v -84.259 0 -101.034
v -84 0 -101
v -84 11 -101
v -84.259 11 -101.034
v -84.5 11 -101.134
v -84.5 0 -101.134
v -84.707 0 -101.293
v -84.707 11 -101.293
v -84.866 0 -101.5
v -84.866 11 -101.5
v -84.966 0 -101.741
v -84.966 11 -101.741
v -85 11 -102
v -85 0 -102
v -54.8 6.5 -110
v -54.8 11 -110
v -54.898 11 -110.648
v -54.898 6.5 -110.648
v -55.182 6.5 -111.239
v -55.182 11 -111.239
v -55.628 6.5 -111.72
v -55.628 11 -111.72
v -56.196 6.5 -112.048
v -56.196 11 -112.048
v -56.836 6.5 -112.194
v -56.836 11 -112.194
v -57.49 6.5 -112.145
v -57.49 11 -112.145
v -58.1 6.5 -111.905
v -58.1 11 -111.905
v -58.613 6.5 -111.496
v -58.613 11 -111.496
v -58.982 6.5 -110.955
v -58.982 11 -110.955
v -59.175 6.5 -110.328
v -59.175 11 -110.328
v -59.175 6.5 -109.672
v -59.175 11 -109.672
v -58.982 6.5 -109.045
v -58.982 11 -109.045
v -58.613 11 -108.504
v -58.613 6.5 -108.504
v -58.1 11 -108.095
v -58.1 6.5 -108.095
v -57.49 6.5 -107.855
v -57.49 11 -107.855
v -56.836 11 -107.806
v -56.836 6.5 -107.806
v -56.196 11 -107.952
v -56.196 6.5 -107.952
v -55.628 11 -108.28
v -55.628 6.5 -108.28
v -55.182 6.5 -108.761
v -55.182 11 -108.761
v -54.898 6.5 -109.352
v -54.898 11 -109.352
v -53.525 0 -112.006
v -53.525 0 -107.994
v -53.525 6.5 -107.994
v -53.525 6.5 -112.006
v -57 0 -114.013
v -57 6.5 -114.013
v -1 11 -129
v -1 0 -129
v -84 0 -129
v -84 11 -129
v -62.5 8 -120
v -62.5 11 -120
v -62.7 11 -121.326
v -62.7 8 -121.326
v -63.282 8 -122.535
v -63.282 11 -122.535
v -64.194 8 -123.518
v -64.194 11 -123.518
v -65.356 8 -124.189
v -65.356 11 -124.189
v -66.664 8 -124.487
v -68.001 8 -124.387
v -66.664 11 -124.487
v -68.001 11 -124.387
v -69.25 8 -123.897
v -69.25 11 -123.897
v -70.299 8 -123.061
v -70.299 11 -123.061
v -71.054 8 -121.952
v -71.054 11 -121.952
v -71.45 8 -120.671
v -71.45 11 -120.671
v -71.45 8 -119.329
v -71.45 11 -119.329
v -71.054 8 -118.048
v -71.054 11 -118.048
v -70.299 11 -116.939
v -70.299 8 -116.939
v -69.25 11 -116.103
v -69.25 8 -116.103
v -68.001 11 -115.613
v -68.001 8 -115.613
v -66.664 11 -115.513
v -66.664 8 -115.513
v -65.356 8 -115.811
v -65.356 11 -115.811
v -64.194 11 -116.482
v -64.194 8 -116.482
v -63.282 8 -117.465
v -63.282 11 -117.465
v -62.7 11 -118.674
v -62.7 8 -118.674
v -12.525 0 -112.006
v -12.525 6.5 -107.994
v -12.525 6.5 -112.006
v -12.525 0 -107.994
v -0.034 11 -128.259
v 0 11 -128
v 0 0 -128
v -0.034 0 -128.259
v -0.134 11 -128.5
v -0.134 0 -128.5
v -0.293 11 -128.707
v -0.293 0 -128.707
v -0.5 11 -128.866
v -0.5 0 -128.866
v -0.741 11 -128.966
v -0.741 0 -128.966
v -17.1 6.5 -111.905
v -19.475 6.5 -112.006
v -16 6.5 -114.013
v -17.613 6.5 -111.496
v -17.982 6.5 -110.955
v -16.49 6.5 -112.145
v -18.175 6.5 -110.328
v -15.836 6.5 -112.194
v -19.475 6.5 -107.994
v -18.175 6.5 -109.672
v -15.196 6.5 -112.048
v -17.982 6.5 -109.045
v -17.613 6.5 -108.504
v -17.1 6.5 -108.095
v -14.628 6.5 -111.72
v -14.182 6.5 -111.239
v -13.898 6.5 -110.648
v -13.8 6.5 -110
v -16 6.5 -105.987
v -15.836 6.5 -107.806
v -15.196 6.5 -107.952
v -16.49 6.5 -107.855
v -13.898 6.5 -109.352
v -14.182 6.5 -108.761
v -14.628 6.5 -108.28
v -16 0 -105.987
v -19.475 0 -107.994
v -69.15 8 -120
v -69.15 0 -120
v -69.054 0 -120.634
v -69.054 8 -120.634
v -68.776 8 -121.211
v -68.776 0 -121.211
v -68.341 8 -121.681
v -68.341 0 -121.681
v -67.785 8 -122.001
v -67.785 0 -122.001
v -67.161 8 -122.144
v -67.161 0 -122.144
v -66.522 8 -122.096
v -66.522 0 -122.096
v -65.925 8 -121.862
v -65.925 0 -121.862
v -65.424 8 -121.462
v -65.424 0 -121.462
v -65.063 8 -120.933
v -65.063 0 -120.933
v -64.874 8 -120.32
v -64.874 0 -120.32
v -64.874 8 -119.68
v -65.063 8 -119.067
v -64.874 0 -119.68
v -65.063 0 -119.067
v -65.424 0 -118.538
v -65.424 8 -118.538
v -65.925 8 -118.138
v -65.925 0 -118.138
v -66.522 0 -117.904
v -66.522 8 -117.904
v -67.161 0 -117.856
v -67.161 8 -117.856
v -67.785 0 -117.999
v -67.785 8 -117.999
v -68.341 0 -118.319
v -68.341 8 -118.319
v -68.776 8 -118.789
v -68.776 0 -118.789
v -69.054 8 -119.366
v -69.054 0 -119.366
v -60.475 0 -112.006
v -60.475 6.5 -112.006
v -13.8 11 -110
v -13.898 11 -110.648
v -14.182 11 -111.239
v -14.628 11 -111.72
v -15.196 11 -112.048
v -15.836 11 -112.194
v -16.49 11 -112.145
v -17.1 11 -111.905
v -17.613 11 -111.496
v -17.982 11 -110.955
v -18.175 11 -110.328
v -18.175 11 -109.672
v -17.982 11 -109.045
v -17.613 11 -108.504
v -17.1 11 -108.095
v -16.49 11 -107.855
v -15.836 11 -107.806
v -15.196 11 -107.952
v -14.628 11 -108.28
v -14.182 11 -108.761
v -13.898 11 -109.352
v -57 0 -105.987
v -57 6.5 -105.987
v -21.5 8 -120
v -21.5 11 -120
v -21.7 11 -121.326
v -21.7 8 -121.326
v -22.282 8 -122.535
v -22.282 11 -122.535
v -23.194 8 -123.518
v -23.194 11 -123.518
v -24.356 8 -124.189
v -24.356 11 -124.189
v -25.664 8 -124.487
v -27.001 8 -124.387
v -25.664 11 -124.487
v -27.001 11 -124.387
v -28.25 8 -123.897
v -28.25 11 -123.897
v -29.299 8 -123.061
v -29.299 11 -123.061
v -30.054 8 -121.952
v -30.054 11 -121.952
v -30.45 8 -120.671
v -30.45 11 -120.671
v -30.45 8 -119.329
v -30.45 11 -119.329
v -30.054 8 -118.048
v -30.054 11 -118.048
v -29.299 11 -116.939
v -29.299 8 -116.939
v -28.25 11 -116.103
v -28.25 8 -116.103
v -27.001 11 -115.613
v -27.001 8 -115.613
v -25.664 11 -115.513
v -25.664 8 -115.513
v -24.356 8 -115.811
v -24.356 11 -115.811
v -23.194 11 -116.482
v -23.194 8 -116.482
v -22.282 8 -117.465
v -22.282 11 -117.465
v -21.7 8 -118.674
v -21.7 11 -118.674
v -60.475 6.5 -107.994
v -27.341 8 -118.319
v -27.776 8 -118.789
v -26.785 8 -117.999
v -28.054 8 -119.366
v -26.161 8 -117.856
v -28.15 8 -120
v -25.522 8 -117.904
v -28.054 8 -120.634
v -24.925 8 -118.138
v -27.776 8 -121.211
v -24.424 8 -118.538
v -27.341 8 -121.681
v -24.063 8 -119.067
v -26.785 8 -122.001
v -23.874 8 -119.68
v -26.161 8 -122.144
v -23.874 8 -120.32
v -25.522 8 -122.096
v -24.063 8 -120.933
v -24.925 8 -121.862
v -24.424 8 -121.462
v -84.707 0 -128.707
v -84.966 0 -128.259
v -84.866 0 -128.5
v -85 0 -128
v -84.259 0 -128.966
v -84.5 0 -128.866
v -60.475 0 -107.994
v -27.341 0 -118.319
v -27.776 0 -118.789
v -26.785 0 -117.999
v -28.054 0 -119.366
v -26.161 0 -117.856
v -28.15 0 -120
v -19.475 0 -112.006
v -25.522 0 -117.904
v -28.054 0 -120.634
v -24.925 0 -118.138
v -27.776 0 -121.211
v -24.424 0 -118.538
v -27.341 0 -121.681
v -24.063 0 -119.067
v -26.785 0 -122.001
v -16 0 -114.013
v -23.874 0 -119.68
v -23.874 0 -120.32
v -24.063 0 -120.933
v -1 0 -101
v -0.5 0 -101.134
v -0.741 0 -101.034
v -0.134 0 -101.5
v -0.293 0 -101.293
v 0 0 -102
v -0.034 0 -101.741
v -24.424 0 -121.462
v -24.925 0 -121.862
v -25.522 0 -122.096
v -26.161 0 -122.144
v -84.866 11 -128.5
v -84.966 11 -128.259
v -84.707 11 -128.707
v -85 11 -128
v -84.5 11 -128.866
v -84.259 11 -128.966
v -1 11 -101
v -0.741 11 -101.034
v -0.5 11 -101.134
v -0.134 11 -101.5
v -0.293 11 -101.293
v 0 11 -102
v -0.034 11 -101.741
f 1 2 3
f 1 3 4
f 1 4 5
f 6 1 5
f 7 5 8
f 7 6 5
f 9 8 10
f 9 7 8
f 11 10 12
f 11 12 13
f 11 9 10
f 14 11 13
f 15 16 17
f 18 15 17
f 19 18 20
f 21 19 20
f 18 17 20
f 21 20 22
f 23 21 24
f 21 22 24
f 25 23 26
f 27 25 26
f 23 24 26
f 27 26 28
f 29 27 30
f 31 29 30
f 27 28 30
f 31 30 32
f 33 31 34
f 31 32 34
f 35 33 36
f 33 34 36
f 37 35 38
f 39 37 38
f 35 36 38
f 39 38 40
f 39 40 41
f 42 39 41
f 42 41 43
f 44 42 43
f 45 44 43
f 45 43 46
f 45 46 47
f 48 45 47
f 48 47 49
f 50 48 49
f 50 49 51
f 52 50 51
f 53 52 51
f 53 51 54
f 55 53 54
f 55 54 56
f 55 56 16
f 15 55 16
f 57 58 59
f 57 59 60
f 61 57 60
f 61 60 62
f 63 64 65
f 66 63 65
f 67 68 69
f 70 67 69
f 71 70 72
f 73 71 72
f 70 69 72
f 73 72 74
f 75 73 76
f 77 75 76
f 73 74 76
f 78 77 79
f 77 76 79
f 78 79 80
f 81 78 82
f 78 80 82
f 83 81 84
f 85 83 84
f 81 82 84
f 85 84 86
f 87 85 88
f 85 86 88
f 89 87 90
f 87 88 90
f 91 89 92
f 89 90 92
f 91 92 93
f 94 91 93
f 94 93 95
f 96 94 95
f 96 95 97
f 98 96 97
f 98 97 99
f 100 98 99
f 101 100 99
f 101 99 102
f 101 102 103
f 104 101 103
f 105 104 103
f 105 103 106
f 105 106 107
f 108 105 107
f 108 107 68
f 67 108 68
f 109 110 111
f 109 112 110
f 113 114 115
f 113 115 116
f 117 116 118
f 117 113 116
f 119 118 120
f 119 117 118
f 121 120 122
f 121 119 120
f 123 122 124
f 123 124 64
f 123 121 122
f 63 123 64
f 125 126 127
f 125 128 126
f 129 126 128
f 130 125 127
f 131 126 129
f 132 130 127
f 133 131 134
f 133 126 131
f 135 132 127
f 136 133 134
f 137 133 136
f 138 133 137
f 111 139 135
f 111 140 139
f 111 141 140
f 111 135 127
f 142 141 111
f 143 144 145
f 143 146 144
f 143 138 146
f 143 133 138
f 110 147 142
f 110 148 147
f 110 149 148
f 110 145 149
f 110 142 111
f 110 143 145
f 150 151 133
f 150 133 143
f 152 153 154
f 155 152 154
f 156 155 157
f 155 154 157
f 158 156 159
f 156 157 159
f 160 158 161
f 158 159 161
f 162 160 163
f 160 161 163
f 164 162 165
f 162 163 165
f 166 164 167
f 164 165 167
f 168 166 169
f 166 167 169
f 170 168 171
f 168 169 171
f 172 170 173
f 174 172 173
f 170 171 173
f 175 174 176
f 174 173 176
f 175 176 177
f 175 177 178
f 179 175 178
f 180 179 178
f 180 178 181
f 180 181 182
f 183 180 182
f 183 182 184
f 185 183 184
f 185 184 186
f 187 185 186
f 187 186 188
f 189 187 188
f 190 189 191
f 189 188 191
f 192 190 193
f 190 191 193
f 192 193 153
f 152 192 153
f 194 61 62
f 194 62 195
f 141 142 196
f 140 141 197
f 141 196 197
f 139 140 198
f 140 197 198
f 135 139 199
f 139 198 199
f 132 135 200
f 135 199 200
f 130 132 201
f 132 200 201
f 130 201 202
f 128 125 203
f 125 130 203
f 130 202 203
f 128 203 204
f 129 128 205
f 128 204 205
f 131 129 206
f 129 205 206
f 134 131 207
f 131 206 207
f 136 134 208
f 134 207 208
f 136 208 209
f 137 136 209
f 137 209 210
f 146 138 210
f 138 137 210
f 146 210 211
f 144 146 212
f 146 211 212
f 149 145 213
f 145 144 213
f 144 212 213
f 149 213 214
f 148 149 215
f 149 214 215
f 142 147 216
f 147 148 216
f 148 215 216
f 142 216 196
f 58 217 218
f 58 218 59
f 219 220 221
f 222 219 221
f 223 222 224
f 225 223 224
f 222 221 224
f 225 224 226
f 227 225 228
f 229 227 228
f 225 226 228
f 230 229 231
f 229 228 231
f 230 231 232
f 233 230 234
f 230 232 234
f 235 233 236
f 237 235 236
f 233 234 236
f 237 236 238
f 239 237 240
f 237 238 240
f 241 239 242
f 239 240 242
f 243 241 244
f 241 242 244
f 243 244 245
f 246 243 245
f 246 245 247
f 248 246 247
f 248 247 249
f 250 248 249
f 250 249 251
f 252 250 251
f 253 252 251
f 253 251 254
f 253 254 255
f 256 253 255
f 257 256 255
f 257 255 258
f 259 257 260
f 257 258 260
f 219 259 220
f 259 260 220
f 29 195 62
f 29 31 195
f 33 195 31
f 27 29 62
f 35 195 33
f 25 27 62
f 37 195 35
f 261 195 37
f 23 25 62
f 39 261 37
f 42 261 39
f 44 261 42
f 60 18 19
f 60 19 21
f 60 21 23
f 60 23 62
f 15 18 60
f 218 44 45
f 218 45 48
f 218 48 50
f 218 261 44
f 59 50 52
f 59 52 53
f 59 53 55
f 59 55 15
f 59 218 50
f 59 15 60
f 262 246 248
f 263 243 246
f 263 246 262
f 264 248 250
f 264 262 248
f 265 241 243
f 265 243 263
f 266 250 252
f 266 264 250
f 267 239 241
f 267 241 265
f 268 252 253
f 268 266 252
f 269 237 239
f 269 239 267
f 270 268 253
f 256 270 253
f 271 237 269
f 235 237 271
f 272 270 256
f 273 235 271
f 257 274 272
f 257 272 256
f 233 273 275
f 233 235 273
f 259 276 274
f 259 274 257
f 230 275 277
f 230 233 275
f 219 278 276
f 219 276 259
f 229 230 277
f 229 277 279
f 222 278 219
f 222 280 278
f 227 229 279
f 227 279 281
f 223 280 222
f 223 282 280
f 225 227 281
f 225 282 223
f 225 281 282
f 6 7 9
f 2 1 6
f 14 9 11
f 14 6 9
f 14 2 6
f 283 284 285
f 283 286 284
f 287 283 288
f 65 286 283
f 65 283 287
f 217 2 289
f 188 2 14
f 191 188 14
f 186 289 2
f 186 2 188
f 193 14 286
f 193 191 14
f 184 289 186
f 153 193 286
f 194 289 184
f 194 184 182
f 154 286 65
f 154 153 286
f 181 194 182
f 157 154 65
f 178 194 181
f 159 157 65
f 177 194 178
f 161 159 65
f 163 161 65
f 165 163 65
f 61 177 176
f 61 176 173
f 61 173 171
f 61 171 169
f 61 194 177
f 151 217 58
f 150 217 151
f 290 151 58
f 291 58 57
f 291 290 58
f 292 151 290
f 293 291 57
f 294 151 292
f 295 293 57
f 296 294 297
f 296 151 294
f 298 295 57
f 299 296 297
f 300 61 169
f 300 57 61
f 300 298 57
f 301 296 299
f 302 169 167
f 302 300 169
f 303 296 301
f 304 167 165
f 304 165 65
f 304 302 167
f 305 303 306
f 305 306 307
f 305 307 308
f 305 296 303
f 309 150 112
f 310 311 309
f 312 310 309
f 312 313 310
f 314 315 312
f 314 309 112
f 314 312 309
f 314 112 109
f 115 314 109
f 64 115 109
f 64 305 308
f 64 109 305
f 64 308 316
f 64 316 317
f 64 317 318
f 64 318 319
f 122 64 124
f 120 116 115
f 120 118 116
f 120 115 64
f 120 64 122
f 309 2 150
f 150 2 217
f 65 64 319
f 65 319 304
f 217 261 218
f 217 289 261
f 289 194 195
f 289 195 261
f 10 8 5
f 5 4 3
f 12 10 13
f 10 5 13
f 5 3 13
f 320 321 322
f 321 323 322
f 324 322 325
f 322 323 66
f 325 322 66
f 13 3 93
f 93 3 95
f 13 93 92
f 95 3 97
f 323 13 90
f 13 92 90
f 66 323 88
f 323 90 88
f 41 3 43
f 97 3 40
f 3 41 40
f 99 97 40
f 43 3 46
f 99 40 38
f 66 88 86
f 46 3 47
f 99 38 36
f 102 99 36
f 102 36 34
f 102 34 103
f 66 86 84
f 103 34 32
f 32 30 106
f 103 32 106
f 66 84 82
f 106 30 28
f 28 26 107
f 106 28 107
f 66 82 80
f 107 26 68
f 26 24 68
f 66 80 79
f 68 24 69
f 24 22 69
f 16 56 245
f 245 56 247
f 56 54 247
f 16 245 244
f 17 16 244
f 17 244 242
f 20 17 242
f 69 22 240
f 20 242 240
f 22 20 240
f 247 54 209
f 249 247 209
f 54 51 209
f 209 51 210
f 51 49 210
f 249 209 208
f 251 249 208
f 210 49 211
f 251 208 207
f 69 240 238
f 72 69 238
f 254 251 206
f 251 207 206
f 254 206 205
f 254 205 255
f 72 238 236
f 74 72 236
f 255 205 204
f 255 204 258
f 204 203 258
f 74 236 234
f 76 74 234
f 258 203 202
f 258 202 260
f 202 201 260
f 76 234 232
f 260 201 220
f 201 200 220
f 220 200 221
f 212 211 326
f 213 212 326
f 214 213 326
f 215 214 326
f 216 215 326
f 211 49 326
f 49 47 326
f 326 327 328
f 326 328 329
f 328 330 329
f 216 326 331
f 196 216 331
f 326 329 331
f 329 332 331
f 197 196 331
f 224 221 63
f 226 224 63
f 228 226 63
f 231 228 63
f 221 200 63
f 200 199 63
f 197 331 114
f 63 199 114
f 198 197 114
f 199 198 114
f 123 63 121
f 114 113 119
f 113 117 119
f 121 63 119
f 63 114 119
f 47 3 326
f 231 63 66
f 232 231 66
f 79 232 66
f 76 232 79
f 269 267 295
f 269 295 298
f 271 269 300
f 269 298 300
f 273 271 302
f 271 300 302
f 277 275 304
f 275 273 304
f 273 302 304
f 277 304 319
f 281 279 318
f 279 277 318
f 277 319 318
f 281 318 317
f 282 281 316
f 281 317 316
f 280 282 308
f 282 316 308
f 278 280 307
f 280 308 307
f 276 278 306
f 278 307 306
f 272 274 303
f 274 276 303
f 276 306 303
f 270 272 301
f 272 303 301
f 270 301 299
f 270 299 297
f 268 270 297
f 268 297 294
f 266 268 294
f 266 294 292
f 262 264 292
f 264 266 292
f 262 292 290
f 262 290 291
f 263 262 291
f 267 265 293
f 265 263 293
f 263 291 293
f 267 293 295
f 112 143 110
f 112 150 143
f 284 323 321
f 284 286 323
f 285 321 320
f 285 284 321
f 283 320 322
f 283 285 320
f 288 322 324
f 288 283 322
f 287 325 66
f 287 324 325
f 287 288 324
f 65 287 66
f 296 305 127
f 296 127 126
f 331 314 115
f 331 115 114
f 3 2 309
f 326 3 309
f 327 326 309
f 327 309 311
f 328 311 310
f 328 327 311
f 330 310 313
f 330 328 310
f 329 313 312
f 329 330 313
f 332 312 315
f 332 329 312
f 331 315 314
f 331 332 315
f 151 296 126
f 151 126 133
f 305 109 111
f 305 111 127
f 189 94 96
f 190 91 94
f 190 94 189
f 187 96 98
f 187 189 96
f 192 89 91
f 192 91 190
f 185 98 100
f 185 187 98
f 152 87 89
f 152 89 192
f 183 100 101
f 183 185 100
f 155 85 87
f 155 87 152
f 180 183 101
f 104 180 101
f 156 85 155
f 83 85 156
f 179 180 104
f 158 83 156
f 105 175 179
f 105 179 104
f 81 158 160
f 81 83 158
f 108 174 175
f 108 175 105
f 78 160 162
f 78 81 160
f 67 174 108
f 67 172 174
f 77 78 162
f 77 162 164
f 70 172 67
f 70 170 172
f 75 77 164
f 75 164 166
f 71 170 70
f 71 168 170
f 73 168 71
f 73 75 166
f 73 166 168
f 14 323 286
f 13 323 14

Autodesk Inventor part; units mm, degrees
ref_plane "YZ Plane" through (0, 0, 0) normal (1, 0, 0) x (0, 1, 0)
ref_plane "XZ Plane" through (0, 0, 0) normal (0, 1, 0) x (-1, 0, 0)
ref_plane "XY Plane" through (0, 0, 0) normal (0, 0, 1) x (1, 0, 0)
sketch "Esboço1" plane through (0, 0, 0) normal (0, 1, 0) x (-1, 0, 0)
  line L0 (0, 0) -> (77, 0)
  line L1 (77, 0) -> (77, -140)
  line L2 (77, -140) -> (0, -140)
  line L3 (0, -140) -> (0, 0)
  circle A0 centre (67, -20) radius 2.15
  circle A1 centre (67, -120) radius 2.15
  circle A2 centre (26, -20) radius 2.15
  circle A3 centre (26, -120) radius 2.15
  dimension "d0" = 77
  dimension "d1" = 140
  dimension "d2" = 4.3
  dimension "d3" = 4.3
  dimension "d4" = 4.3
  dimension "d5" = 4.3
  dimension "d6" = 10
  dimension "d7" = 10
  dimension "d8" = 20
  dimension "d9" = 20
  dimension "d10" = 20
  dimension "d11" = 20
  dimension "d12" = 26
  dimension "d13" = 26
extrude "Extrusão1" add sketch "Esboço1" along normal blind 11
sketch "Esboço2" plane through (0, 11, 0) normal (0, 1, 0) x (1, 0, 0)
  circle A0 centre (-67, 20) radius 2.15 projected
  circle A1 centre (-26, 20) radius 2.15 projected
  circle A2 centre (-26, 120) radius 2.15 projected
  circle A3 centre (-67, 120) radius 2.15 projected
  circle A4 centre (-67, 20) radius 4.5
  circle A5 centre (-67, 120) radius 2.15 projected
  circle A6 centre (-67, 120) radius 4.5
  circle A7 centre (-26, 120) radius 2.15 projected
  circle A8 centre (-26, 120) radius 4.5
  circle A9 centre (-26, 20) radius 2.15 projected
  circle A10 centre (-26, 20) radius 4.5
  point P0 (0, 0)
  dimension "d16" = 9
  dimension "d17" = 9
  dimension "d18" = 9
  dimension "d19" = 9
extrude "Extrusão2" cut sketch "Esboço2" against normal blind 3 contours A3 | A4 | A6 | A8 | A10
sketch "Esboço3" plane through (0, 11, 0) normal (0, 1, 0) x (1, 0, 0)
  point P0 (0, 0)
sketch "Esboço4" plane through (0, 11, 0) normal (0, 1, 0) x (1, 0, 0)
  circle A0 centre (-57, 30) radius 2.2
  circle A1 centre (-57, 110) radius 2.2
  circle A2 centre (-67, 20) radius 2.15 projected
  circle A3 centre (-67, 120) radius 2.15 projected
  circle A4 centre (-16, 30) radius 2.2
  circle A5 centre (-16, 110) radius 2.2
  circle A6 centre (-26, 20) radius 2.15 projected
  circle A7 centre (-26, 120) radius 2.15 projected
  point P0 (0, 0)
  dimension "d22" = 4.4
  dimension "d23" = 4.4
  dimension "d24" = 10
  dimension "d25" = 10
  dimension "d26" = 10
  dimension "d27" = 10
  dimension "d28" = 4.4
  dimension "d29" = 4.4
  dimension "d30" = 10
  dimension "d31" = 10
  dimension "d32" = 10
  dimension "d33" = 10
extrude "Extrusão3" cut sketch "Esboço4" against normal blind 12 contours A0 | A1 | A4 | A5
sketch "Esboço5" plane through (0, 0, 0) normal (0, -1, 0) x (1, 0, 0)
  circle A0 centre (-57, -110) radius 2.2 projected
  circle A1 centre (-16, -110) radius 2.2 projected
  circle A2 centre (-16, -30) radius 2.2 projected
  circle A3 centre (-57, -30) radius 2.2 projected
  line L0 (-53.525, -112.0063) -> (-57, -114.0126)
  line L1 (-57, -114.0126) -> (-60.475, -112.0063)
  line L2 (-60.475, -112.0063) -> (-60.475, -107.9937)
  line L3 (-60.475, -107.9937) -> (-57, -105.9874)
  line L4 (-57, -105.9874) -> (-53.525, -107.9937)
  line L5 (-53.525, -107.9937) -> (-53.525, -112.0063)
  line L6 (-53.525, -32.0063) -> (-57, -34.0126)
  line L7 (-57, -34.0126) -> (-60.475, -32.0063)
  line L8 (-60.475, -32.0063) -> (-60.475, -27.9937)
  line L9 (-60.475, -27.9937) -> (-57, -25.9874)
  line L10 (-57, -25.9874) -> (-53.525, -27.9937)
  line L11 (-53.525, -27.9937) -> (-53.525, -32.0063)
  line L12 (-16, -105.9874) -> (-12.525, -107.9937)
  line L13 (-12.525, -107.9937) -> (-12.525, -112.0063)
  line L14 (-12.525, -112.0063) -> (-16, -114.0126)
  line L15 (-16, -114.0126) -> (-19.475, -112.0063)
  line L16 (-19.475, -112.0063) -> (-19.475, -107.9937)
  line L17 (-19.475, -107.9937) -> (-16, -105.9874)
  circle A4 centre (-16, -30) radius 2.2 projected
  line L18 (-12.525, -32.0063) -> (-16, -34.0126)
  line L19 (-16, -34.0126) -> (-19.475, -32.0063)
  line L20 (-19.475, -32.0063) -> (-19.475, -27.9937)
  line L21 (-19.475, -27.9937) -> (-16, -25.9874)
  line L22 (-16, -25.9874) -> (-12.525, -27.9937)
  line L23 (-12.525, -27.9937) -> (-12.525, -32.0063)
  line L24 (-77, -140) -> (-77, 0) projected
  line L25 (0, 0) -> (0, -140) projected
  dimension "d36" = 6.95
  dimension "d37" = 6.95
  dimension "d38" = 6.95
  dimension "d39" = 6.95
extrude "Extrusão4" cut sketch "Esboço5" against normal blind 6.5 contours A0 | L0 L1 L2 L3 L4 L5 | L6 L7 L8 L9 L10 L11 | L12 L13 L14 L15 L16 L17 | L18 L19 L20 L21 L22 L23
sketch "Esboço6" plane through (-77, 0, 0) normal (0, 0, 1) x (1, 0, 0)
  line L0 (0, 0) -> (77, 0) projected
  line L1 (77, 0) -> (77, 11) projected
  line L2 (0, 11) -> (77, 11) projected
  line L3 (0, 0) -> (0, 11) projected
extrude "Extrusão5" add sketch "Esboço6" along normal blind 0.5
sketch "Esboço7" plane through (0, 0, -140) normal (0, 0, -1) x (-1, 0, 0)
  line L0 (0, 0) -> (77, 0) projected
  line L1 (77, 0) -> (77, 11) projected
  line L2 (0, 11) -> (77, 11) projected
  line L3 (0, 0) -> (0, 11) projected
  point P0 (0, 0)
extrude "Extrusão6" add sketch "Esboço7" along normal blind 0.5
sketch "Esboço8" plane through (-77, 0, 0.5) normal (-1, 0, 0) x (0, 0, 1)
  line L0 (0, 0) -> (-141, 0) projected
  line L1 (0, 11) -> (0, 0) projected
  line L2 (0, 11) -> (-141, 11) projected
  line L3 (-141, 0) -> (-141, 11) projected
  point P0 (-0.5, 0)
extrude "Extrusão7" add sketch "Esboço8" along normal blind 8
fillet "Arredondamento1" radius 1 4 edges at (-85, 5.5, 0.5) (0, 5.5, 0.5) (-85, 5.5, -140.5) (0, 5.5, -140.5)
sketch "Esboço9" plane through (0, 11, 0) normal (0, 1, 0) x (1, 0, 0)
  line L0 (0, 0.5) -> (0, 139.5) projected
  line L1 (-85, 139.5) -> (-85, 0.5) projected
  line L2 (0, 129) -> (-85, 129)
  line L3 (-85, 129) -> (-85, 101)
  line L4 (-85, 101) -> (0, 101)
  line L5 (0, 101) -> (0, 129)
  circle A0 centre (-16, 110) radius 2.2 projected
  circle A1 centre (-26, 120) radius 4.5 projected
  point P0 (0, 0)
  point P1 (0, 101)
  dimension "d49" = 9
  dimension "d50" = 9
extrude "Extrusão8" cut sketch "Esboço9" against normal mid plane 22 contours L4 L1 L2 L0 | A1 keep common part
fillet "Arredondamento2" radius 1 4 edges at (0, 5.5, -101) (0, 5.5, -129) (-85, 5.5, -101) (-85, 5.5, -129)
equation "\"d4\" = d3"
equation "\"d5\" = d3"
equation "\"d7\" = d6"
equation "\"d9\" = d8"
equation "\"d10\" = d9"
equation "\"d11\" = d8"
equation "\"d16\" = d19"
equation "\"d22\" = d28"
equation "\"d23\" = d29"
equation "\"d26\" = d25"
equation "\"d27\" = d26"
equation "\"d29\" = d28"
equation "\"d30\" = d24"
equation "\"d33\" = d32"
equation "\"d36\" = d39"
equation "\"d37\" = d39"
equation "\"d38\" = d39"
properties part number "suporte-fonte2"
